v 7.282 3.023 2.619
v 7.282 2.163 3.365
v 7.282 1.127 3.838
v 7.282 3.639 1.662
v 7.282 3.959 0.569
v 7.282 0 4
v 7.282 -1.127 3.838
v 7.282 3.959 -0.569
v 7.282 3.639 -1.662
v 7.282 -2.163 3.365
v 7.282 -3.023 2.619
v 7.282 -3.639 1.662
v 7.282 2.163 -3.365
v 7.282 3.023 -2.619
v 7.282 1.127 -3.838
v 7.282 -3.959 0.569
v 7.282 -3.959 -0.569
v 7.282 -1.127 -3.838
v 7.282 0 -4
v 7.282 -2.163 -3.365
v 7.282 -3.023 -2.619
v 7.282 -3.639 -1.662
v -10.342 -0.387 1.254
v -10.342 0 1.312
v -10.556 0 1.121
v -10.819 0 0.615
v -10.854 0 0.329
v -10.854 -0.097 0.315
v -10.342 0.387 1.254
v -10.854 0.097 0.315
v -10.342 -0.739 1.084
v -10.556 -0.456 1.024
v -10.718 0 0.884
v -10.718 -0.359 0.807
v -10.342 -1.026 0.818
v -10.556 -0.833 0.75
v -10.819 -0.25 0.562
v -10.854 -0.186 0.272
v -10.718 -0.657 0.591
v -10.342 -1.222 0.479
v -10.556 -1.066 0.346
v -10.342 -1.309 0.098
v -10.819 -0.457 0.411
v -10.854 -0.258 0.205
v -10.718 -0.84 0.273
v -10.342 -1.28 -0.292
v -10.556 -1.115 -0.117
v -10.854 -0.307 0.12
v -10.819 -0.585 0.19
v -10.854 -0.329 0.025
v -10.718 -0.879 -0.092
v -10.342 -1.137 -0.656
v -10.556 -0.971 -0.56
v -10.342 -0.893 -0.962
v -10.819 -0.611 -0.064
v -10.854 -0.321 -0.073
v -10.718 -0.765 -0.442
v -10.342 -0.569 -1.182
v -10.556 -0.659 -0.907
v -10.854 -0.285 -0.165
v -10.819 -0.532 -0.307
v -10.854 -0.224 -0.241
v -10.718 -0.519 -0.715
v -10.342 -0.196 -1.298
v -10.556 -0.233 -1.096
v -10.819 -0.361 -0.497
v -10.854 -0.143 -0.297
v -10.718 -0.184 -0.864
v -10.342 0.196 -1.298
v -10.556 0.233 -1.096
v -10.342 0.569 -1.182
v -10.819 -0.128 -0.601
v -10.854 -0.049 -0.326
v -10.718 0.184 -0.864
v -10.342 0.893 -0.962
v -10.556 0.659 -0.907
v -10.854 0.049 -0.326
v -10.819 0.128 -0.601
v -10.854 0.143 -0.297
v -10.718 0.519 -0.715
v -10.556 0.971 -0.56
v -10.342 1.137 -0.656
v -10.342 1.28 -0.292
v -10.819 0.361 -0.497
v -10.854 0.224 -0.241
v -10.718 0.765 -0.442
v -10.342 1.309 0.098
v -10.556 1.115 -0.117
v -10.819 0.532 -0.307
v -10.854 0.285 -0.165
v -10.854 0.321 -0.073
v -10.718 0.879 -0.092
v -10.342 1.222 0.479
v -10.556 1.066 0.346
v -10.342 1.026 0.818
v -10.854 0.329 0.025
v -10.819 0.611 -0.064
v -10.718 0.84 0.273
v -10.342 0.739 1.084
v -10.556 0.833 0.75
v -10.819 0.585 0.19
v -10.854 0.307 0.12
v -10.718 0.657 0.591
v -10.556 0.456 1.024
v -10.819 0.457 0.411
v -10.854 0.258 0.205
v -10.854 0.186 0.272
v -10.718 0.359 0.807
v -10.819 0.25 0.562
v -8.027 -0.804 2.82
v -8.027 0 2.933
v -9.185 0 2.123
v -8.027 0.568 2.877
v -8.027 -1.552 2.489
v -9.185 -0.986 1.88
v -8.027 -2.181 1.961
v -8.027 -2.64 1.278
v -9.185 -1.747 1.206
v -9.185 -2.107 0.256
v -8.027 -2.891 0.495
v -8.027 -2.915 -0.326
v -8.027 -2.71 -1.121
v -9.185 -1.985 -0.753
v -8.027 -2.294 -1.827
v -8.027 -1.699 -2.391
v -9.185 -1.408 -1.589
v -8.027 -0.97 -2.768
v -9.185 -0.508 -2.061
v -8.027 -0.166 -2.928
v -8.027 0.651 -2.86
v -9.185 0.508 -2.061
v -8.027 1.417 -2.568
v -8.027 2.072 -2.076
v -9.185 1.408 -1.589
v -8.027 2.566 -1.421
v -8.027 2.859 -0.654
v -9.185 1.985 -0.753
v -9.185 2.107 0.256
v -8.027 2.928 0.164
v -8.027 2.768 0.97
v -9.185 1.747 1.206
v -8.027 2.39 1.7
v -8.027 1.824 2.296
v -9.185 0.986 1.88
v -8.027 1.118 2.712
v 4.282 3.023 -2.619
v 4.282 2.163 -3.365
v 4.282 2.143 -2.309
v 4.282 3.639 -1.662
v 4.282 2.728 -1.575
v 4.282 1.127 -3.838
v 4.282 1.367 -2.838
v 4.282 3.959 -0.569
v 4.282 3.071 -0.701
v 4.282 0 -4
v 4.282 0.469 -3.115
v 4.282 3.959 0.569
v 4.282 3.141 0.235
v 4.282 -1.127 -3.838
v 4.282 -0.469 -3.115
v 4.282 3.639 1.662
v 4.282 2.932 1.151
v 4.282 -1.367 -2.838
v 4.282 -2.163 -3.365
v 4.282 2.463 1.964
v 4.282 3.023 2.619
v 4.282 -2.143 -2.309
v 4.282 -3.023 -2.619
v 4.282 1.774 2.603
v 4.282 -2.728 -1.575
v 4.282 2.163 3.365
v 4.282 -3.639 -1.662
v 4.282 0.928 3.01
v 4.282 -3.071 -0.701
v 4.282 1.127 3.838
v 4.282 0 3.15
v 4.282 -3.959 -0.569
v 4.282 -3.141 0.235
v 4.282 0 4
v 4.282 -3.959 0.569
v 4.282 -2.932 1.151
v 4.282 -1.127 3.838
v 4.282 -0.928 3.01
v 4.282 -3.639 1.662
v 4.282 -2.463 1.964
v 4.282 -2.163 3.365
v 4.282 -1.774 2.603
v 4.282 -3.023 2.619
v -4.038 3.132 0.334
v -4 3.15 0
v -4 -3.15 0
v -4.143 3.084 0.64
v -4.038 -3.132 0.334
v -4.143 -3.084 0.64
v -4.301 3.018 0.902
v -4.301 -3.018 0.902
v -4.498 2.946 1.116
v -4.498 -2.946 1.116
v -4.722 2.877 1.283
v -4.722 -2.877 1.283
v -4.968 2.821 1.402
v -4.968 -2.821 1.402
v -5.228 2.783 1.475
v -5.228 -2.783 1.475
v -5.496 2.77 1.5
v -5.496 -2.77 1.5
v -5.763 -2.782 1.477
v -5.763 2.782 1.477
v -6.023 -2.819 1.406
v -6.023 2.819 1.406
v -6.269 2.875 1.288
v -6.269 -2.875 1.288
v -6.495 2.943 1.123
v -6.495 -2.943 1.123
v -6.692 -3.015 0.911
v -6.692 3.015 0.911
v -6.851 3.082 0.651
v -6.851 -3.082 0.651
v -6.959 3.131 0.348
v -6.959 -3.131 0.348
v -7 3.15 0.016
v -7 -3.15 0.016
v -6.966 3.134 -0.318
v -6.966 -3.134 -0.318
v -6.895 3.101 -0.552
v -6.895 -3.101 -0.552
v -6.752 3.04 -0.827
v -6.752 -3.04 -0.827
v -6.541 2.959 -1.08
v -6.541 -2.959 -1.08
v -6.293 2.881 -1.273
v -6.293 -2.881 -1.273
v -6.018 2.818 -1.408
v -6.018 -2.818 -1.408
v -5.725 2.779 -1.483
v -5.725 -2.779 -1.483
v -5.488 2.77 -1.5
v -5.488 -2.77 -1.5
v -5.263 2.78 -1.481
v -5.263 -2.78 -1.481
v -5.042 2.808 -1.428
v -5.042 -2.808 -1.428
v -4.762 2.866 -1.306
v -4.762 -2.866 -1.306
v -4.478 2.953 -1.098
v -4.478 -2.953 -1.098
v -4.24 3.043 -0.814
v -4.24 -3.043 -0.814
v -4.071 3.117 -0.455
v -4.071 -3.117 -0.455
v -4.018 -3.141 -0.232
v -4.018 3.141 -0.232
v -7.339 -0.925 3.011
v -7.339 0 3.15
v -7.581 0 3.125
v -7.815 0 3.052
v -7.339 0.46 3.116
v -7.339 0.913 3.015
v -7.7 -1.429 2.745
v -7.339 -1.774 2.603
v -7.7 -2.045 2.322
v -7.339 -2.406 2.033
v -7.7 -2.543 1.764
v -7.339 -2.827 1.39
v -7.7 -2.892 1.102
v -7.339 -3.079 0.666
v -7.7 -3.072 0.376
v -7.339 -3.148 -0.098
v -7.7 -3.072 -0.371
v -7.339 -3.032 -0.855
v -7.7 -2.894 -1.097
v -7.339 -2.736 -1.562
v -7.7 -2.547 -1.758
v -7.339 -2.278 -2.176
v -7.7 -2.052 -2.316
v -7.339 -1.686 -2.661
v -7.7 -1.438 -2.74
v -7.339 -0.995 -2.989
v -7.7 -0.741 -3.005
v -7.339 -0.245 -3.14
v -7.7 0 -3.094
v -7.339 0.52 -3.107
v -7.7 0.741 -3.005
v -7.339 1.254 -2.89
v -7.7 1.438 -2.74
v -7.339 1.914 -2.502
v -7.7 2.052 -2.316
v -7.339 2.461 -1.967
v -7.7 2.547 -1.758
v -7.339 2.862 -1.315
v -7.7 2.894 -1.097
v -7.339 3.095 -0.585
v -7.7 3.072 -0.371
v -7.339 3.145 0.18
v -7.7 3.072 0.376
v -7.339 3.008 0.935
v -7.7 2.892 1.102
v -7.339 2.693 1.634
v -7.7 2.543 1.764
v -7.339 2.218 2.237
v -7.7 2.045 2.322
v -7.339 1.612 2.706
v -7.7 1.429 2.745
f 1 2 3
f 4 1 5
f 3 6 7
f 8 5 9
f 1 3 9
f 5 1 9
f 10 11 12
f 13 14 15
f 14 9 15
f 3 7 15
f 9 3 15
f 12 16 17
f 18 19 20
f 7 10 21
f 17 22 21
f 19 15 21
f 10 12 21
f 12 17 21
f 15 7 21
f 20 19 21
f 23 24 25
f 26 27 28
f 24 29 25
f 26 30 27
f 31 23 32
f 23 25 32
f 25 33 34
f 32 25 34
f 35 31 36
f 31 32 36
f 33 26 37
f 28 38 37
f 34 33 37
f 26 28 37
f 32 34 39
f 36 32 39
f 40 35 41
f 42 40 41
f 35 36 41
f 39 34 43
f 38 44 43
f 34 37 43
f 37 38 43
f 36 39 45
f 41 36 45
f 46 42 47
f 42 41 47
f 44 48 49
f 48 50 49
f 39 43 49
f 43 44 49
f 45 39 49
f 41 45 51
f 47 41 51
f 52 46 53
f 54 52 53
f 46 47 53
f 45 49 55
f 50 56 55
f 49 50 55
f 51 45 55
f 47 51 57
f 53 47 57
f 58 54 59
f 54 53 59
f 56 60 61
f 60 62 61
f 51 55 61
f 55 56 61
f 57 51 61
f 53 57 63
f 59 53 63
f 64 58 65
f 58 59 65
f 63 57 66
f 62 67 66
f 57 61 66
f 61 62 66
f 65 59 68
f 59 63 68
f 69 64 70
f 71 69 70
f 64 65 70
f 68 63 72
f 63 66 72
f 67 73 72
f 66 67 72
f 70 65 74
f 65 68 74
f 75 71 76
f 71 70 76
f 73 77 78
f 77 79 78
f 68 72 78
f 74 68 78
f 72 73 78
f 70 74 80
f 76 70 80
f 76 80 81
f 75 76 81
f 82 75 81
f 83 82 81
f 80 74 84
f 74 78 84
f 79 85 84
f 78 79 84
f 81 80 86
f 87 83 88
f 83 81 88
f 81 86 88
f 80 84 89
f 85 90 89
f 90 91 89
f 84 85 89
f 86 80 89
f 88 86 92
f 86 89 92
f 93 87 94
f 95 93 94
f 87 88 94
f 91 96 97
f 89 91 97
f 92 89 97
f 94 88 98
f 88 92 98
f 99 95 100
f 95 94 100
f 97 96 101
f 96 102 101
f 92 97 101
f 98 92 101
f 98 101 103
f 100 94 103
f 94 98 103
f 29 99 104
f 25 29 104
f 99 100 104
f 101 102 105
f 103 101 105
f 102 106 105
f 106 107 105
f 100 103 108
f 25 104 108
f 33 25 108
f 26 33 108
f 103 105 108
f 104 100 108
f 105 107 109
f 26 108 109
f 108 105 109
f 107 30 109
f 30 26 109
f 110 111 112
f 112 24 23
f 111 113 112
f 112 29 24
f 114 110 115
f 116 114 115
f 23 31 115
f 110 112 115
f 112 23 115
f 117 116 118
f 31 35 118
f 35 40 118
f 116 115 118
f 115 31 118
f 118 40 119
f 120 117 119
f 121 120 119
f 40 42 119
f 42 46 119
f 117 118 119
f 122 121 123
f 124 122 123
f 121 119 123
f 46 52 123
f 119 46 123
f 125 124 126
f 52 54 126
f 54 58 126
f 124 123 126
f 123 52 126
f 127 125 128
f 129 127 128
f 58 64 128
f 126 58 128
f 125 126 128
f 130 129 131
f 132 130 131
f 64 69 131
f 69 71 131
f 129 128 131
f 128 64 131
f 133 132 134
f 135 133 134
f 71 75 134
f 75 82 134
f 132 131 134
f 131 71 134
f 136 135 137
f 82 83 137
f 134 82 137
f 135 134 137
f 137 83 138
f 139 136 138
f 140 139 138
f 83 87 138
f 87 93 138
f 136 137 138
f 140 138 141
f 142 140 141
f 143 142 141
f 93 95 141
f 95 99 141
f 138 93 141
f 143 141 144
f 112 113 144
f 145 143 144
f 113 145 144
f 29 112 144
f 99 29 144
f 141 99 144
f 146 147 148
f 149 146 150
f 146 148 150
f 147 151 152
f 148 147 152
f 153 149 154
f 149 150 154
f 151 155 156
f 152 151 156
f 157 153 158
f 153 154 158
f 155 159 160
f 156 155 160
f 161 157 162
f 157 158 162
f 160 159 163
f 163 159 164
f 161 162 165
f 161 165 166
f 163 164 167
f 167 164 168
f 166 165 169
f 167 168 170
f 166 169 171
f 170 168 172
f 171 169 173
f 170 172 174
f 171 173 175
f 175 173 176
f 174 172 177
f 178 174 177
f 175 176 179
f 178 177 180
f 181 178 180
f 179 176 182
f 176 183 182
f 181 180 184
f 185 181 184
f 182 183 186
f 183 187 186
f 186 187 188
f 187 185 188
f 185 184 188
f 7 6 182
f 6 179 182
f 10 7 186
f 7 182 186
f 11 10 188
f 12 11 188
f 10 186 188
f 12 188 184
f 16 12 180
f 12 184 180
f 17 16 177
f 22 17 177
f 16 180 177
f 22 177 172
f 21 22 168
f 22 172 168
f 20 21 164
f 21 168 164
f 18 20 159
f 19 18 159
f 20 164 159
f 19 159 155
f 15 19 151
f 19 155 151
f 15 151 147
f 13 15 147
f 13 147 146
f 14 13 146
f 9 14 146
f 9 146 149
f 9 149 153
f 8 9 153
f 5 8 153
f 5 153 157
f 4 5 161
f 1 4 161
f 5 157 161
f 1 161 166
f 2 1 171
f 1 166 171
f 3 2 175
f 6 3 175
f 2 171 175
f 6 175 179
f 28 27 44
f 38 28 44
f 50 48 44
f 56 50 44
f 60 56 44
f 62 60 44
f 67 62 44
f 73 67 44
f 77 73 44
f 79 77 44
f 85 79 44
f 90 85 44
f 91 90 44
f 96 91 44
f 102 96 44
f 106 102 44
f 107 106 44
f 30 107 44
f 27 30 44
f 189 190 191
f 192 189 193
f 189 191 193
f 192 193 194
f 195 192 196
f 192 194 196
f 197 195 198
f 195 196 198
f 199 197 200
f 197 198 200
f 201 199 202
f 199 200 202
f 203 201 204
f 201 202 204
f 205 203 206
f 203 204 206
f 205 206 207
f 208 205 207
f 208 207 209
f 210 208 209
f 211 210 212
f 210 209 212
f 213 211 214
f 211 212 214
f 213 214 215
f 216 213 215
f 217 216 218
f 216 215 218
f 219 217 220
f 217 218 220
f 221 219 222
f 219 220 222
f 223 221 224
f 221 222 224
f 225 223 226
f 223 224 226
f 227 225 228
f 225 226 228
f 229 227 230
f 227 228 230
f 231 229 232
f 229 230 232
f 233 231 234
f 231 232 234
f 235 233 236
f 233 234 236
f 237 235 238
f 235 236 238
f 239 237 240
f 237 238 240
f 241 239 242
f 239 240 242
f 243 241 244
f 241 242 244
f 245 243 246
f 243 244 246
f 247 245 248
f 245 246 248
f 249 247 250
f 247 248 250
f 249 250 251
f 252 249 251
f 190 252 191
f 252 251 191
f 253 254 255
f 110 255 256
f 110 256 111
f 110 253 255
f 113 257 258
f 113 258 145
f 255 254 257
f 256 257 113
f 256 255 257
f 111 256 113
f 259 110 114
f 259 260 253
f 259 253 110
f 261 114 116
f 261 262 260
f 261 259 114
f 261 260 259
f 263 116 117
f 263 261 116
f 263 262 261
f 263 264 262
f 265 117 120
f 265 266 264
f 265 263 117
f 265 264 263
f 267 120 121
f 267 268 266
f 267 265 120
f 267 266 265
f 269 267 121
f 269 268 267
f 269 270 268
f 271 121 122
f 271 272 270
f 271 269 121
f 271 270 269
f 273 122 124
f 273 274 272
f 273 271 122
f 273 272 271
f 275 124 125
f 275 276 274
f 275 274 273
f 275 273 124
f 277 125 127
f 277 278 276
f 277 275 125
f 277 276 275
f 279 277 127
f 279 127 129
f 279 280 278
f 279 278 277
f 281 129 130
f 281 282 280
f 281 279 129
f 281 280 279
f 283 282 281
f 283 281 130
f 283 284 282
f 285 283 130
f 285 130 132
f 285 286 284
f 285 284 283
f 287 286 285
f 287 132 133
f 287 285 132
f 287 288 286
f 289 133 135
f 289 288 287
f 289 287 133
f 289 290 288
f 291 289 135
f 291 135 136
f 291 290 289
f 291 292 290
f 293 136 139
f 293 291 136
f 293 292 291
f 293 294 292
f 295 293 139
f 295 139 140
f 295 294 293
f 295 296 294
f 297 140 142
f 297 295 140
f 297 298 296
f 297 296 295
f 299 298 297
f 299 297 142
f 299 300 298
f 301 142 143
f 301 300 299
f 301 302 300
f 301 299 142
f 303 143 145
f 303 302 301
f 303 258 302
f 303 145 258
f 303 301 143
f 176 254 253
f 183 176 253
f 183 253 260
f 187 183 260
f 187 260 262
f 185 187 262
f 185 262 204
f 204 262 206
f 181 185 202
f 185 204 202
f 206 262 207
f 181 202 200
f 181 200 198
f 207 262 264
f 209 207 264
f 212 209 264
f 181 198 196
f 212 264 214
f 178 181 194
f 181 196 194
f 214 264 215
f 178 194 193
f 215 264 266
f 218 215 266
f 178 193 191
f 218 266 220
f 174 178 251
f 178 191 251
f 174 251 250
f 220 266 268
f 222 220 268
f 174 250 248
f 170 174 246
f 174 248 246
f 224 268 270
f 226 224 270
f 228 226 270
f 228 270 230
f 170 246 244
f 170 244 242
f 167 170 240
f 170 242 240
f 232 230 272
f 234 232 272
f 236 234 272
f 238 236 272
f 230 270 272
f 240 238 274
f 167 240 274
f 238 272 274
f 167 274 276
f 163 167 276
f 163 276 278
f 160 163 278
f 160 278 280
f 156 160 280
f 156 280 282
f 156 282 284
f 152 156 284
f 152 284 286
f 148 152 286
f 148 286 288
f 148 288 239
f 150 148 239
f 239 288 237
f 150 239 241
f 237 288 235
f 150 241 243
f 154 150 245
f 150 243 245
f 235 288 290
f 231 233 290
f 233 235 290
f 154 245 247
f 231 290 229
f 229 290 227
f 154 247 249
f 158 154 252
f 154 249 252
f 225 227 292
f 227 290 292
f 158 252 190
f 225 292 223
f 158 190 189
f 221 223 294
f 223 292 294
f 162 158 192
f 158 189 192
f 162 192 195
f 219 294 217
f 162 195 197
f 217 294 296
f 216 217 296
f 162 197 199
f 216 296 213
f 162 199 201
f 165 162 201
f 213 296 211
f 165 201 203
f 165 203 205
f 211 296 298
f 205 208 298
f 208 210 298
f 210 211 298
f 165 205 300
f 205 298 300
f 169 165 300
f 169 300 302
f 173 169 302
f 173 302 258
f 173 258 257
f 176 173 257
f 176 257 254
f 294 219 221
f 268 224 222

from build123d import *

# Parameters (mm, degrees)
F2_R     = 1.2
F3_R     = 1.5
F4_DEPTH = 4.001
F5_R     = 1.5
F6_DEPTH = 4.001


with BuildPart() as f1:
    # F0 (on Front) → F1 (revolve)
    with BuildSketch(Plane.XZ):
        Polygon((4.282442, 3.15), (-7.717558, 3.15), (-10.853604, 0.954117), (-10.853604, 0), (7.282442, 0), (7.282442, 4), (4.282442, 4), align=None)
    revolve(axis=Axis((2.625406, 0, 0), (1, 0, 0)))

    # F2
    f2_edges = [f1.edges().sort_by_distance(p)[0] for p in [
        (-10.853604, 0, -0.954117),
        (-7.717558, 0, -3.15),
    ]]
    fillet(f2_edges, radius=F2_R)

    # F3 (on Front) → F4 (cut, through all)
    with BuildSketch(Plane.XZ):
        with Locations((-5.5, 0)):
            Circle(F3_R)
    extrude(amount=F4_DEPTH, mode=Mode.SUBTRACT)

    # F5 (on Front) → F6 (cut, through all)
    with BuildSketch(Plane.XZ):
        with Locations((-5.5, 0)):
            Circle(F5_R)
    extrude(amount=-F6_DEPTH, mode=Mode.SUBTRACT)


solid = f1.part
